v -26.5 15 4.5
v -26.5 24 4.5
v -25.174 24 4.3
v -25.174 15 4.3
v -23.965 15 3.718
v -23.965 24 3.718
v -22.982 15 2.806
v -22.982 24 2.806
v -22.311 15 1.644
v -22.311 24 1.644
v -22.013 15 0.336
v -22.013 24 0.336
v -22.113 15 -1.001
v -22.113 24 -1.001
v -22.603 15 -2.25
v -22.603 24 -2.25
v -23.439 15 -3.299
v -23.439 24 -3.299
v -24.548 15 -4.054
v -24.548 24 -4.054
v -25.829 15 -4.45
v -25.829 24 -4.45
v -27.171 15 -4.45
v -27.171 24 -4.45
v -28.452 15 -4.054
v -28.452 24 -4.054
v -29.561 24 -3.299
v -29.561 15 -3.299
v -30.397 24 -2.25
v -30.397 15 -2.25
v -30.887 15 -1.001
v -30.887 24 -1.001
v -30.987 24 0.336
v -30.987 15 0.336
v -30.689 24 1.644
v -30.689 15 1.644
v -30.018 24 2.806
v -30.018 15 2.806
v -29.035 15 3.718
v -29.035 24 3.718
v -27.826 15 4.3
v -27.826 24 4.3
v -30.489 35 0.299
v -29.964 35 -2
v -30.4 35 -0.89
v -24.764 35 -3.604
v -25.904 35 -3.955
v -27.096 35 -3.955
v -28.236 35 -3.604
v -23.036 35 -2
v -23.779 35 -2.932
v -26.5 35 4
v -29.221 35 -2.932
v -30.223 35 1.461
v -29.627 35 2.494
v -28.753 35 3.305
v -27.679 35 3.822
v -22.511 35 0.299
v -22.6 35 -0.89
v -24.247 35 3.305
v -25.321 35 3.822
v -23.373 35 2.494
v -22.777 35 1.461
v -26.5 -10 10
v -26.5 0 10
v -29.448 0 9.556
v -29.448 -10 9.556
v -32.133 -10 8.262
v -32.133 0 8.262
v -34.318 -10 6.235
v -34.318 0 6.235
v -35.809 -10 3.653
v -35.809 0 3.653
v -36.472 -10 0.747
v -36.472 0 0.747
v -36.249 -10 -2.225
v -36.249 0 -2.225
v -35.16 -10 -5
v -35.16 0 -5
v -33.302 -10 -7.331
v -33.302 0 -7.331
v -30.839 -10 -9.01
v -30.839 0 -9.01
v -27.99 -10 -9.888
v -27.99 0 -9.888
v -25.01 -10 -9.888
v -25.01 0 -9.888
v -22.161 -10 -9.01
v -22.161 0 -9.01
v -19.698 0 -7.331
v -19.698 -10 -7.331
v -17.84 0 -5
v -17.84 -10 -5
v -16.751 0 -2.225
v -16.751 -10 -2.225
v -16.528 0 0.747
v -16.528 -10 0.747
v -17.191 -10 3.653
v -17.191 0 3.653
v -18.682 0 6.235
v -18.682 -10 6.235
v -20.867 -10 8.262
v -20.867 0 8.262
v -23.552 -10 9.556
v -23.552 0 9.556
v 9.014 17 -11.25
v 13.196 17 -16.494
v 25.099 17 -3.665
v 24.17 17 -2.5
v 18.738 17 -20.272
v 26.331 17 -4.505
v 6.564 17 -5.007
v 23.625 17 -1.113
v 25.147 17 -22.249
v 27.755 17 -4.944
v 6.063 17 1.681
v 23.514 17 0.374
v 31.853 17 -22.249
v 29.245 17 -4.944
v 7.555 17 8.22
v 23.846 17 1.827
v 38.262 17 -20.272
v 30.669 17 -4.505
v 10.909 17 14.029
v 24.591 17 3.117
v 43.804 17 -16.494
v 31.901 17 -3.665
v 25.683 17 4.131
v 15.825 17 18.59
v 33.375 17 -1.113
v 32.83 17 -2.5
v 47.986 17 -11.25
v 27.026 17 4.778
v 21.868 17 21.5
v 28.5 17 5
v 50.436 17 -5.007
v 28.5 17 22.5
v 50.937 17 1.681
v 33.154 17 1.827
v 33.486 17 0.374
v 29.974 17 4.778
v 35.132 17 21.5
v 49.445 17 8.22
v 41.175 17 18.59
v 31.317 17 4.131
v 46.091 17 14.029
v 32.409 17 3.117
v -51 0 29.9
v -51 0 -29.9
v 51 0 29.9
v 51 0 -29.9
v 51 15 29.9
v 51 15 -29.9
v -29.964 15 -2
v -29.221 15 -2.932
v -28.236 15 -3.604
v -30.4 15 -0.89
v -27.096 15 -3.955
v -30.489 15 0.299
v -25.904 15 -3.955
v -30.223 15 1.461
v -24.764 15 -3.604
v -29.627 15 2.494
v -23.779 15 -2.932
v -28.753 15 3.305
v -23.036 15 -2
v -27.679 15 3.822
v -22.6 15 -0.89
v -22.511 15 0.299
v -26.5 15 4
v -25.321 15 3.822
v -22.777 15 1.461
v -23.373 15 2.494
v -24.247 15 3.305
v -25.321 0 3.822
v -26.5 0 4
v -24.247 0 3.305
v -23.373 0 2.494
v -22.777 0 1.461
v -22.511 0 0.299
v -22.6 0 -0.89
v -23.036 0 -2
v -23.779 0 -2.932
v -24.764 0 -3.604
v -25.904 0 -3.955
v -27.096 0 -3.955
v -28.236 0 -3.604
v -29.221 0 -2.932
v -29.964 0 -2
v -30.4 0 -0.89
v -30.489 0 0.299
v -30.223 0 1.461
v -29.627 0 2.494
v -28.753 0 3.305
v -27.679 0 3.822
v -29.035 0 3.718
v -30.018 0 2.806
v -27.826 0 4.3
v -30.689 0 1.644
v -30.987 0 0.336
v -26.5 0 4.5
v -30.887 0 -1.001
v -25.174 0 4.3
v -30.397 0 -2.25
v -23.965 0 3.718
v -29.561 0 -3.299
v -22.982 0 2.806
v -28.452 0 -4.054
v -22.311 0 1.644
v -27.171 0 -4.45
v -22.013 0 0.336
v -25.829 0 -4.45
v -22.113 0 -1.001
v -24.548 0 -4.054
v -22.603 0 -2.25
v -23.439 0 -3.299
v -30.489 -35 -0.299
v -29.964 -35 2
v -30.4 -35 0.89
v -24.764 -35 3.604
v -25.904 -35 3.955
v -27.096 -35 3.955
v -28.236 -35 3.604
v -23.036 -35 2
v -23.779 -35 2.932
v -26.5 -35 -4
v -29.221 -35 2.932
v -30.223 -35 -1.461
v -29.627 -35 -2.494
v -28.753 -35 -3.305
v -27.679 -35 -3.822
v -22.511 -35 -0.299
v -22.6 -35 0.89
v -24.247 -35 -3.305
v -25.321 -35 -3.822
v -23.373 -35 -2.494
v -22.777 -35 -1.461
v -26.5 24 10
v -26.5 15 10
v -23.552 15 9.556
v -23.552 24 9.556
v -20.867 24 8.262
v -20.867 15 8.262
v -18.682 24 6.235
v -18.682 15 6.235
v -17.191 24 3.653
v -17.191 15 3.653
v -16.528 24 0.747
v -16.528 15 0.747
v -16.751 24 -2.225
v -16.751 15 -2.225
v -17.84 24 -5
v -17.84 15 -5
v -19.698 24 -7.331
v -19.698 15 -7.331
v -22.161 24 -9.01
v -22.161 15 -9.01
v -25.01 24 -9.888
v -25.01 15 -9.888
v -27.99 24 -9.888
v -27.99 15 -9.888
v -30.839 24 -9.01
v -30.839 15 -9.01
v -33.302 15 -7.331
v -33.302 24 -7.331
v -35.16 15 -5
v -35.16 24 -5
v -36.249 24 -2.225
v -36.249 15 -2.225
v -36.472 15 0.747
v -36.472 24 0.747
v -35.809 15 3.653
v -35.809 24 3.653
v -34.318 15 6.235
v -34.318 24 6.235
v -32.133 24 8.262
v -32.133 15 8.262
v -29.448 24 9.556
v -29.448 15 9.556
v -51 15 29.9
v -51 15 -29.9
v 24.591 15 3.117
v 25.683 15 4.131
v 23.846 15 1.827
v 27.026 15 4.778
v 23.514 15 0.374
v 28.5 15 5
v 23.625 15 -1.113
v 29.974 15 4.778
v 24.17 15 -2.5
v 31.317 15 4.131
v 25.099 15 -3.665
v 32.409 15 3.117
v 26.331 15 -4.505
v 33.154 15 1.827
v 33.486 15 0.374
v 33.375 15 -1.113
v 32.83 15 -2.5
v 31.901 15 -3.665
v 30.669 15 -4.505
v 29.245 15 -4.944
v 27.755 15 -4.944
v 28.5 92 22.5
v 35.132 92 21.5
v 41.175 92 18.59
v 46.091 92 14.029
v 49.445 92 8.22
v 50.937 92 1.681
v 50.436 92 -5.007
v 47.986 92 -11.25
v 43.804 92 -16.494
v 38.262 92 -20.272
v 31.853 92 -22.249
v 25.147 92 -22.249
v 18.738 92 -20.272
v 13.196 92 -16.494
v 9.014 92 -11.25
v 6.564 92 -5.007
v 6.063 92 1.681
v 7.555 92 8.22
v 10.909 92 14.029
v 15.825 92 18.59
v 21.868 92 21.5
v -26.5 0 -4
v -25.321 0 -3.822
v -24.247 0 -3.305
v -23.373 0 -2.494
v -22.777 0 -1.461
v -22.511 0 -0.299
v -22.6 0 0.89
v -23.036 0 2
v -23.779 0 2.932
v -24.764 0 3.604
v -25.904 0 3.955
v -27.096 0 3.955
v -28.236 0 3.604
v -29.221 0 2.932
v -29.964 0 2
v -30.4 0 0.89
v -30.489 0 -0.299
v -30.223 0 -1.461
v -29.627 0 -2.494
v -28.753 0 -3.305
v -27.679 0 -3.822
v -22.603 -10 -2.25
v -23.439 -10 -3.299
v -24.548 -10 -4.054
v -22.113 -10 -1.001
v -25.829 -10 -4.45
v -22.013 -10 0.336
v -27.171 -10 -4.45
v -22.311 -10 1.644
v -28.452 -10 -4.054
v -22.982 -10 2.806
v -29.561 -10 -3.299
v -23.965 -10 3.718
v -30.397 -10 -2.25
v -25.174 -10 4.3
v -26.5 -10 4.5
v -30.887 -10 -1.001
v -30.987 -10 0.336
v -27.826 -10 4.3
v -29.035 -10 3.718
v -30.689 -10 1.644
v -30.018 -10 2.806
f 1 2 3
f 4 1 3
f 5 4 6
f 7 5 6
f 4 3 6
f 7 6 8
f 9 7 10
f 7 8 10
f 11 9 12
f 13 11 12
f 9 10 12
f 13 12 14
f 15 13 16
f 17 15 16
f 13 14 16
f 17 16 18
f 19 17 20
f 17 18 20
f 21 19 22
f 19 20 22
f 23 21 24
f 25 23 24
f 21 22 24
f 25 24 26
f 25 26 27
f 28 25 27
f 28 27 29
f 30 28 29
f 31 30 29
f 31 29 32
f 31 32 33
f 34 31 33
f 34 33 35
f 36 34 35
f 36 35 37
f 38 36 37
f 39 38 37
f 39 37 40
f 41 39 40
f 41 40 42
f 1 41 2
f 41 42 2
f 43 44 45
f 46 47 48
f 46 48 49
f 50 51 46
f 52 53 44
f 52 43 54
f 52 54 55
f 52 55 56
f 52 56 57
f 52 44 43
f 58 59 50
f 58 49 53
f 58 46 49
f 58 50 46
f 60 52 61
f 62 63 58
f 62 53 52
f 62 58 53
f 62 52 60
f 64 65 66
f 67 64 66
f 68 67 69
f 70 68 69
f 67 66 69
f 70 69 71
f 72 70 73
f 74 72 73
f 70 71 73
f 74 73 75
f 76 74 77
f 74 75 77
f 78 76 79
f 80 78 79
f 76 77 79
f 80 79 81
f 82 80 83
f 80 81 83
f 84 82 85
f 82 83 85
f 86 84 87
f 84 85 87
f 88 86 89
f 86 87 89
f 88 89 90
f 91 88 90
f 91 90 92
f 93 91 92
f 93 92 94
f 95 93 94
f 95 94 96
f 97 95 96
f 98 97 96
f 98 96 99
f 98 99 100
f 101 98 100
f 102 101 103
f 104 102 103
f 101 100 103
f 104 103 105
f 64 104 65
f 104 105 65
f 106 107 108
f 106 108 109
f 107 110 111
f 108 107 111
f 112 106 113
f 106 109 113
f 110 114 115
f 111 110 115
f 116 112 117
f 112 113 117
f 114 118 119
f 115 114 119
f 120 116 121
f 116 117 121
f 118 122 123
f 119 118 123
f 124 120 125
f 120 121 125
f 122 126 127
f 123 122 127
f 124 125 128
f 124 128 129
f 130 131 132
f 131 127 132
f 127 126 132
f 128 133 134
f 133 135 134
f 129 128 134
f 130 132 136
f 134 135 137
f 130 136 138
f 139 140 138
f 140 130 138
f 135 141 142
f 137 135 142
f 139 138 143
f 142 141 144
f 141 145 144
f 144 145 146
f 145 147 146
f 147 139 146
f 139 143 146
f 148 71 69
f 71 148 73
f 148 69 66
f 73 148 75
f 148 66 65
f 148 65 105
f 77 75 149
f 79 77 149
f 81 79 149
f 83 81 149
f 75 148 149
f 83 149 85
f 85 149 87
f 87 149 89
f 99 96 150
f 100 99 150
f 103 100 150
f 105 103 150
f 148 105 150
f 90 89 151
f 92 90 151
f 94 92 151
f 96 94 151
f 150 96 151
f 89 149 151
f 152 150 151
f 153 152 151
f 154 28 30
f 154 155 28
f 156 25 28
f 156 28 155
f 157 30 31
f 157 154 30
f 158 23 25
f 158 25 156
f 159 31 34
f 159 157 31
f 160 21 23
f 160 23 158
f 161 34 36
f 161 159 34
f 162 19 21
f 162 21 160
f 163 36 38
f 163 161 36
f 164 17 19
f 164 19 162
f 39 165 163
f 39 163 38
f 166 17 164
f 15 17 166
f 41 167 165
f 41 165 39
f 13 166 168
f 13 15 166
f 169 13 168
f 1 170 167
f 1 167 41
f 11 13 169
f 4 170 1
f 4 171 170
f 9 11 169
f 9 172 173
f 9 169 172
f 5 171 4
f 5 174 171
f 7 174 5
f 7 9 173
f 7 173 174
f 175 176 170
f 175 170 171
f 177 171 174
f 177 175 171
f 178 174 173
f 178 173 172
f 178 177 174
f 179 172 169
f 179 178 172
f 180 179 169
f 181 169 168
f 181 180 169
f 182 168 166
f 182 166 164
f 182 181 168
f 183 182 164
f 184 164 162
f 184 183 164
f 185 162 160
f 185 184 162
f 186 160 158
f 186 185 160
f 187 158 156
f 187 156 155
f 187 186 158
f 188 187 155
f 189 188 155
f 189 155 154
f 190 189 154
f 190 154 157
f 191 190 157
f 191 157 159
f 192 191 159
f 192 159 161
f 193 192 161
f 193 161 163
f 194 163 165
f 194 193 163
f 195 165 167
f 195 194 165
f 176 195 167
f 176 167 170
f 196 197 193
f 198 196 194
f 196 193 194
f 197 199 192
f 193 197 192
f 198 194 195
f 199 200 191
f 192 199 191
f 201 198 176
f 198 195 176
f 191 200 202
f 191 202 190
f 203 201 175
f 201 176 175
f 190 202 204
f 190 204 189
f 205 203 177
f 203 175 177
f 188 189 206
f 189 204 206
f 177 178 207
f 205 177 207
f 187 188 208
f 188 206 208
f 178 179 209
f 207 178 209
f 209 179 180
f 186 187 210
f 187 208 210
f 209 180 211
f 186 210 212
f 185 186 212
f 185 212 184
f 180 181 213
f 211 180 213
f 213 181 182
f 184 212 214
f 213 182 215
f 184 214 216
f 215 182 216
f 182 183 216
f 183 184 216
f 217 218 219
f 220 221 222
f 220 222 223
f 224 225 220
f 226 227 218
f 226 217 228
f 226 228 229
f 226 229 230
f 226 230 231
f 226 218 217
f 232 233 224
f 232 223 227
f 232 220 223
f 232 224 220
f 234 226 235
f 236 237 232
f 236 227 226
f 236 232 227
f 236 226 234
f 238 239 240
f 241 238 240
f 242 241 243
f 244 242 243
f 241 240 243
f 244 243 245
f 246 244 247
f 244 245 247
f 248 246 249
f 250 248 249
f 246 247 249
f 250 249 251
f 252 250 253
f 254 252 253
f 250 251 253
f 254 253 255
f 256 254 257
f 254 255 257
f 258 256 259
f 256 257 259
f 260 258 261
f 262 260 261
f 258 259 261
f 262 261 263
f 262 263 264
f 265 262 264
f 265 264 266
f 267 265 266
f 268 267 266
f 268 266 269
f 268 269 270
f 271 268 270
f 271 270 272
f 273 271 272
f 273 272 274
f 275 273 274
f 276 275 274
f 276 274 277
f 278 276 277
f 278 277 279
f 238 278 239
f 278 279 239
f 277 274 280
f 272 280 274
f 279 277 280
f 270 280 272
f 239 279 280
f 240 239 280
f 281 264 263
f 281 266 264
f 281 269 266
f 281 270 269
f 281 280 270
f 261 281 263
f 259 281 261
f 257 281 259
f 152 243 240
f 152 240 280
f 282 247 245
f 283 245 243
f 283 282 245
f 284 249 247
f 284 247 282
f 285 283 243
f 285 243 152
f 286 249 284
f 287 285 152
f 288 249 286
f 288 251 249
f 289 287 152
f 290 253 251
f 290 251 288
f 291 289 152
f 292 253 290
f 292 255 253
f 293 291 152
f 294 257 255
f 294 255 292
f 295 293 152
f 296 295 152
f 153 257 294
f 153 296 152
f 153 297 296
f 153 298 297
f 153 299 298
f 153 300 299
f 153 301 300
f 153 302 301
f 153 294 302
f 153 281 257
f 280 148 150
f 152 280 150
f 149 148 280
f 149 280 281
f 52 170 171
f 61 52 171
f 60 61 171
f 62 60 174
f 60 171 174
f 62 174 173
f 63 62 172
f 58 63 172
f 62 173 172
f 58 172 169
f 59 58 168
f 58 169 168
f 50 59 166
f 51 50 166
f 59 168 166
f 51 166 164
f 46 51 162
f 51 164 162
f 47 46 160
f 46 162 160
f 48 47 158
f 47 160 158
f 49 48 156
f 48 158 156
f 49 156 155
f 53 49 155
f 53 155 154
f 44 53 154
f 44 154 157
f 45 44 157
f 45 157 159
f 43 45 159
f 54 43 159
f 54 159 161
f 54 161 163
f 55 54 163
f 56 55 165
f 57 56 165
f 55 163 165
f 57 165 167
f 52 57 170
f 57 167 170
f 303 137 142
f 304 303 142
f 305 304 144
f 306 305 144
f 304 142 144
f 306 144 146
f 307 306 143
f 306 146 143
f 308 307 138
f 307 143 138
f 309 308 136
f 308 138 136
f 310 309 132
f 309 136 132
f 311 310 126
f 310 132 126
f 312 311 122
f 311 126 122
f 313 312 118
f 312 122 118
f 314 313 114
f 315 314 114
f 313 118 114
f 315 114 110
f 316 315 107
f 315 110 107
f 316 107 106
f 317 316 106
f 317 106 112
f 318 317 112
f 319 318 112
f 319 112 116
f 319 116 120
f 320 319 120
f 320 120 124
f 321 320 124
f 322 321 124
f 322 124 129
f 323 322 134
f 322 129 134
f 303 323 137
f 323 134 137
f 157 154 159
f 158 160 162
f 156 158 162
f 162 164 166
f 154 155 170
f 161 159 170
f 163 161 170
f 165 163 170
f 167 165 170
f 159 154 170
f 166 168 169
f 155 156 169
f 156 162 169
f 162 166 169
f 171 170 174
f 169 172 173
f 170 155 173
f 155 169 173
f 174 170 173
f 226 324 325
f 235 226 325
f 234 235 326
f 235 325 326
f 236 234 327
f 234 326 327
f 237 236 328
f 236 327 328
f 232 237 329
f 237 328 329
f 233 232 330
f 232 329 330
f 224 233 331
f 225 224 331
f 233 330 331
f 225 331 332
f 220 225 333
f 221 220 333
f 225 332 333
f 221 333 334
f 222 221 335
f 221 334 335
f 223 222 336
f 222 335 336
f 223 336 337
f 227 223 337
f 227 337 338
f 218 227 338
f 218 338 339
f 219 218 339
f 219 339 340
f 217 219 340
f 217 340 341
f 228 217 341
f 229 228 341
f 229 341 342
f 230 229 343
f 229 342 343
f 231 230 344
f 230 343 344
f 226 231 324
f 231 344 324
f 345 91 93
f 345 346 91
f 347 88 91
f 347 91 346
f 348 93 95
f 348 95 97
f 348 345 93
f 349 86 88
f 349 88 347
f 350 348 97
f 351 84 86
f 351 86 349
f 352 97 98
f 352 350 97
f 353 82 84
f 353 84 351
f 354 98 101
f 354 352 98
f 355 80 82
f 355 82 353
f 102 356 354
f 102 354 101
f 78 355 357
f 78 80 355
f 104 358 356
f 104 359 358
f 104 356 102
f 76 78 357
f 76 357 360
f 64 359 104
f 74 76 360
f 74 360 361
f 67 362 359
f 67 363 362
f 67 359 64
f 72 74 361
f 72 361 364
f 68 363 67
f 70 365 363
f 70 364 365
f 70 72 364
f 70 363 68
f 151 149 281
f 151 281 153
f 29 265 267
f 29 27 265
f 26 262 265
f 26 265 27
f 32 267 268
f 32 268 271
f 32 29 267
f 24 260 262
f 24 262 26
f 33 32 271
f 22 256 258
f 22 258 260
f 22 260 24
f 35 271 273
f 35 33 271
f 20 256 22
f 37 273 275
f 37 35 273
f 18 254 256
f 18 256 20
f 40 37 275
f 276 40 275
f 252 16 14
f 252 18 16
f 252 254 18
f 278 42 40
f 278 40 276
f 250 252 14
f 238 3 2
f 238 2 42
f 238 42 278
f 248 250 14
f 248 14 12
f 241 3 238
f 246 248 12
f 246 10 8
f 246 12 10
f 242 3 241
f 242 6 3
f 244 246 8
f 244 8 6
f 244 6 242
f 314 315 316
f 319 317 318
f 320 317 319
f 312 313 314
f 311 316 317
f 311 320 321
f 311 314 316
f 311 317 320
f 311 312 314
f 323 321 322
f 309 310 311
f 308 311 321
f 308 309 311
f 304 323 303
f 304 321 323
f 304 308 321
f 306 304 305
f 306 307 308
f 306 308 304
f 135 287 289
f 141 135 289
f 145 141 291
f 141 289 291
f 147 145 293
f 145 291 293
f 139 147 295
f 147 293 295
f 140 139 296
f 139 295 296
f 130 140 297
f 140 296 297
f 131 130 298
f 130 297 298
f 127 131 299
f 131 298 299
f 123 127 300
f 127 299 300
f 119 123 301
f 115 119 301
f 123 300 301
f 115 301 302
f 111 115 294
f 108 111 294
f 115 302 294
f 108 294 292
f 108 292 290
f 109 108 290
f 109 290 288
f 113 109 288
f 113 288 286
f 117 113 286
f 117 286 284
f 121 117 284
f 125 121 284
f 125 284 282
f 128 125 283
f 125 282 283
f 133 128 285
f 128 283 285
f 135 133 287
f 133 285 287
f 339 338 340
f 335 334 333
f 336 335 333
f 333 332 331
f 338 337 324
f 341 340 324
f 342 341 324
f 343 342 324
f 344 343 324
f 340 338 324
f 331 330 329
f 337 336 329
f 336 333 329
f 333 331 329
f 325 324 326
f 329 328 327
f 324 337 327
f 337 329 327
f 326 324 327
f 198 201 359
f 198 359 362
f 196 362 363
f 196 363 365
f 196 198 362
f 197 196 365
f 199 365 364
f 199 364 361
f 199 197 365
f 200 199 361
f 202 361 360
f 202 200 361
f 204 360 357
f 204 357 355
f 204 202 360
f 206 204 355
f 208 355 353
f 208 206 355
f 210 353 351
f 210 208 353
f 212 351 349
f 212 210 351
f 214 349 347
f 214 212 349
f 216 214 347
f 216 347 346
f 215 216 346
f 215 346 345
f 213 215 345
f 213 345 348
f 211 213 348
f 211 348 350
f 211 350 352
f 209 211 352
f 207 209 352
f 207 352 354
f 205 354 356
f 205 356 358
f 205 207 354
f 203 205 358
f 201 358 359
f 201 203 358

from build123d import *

# Parameters (mm, degrees)
SKETCH1_W           = 102
SKETCH1_H           = 59.8
SKETCH1_R           = 4
BOSS_EXTRUDE1_DEPTH = 15
SKETCH3_R           = 5
BOSS_EXTRUDE3_DEPTH = 2
SKETCH4_R           = 22.5
BOSS_EXTRUDE4_DEPTH = 75
SKETCH5_R           = 10
BOSS_EXTRUDE5_DEPTH = 9
SKETCH6_R           = 4.5
CUT_EXTRUDE1_DEPTH  = 9
SKETCH7_R           = 4
BOSS_EXTRUDE6_DEPTH = 20
SKETCH8_R           = 10
SKETCH8_R_2         = 4.5
BOSS_EXTRUDE7_DEPTH = 10
SKETCH9_R           = 4
BOSS_EXTRUDE8_DEPTH = 35


with BuildPart() as part:
    # Sketch1 → Boss-Extrude1 (new body)
    with BuildSketch(Plane(origin=(0, 0, 0), x_dir=(1, 0, 0), z_dir=(0, 1, 0))):
        Rectangle(SKETCH1_W, SKETCH1_H)
        with Locations(Location((-26.5, 0, 0), (0, 0, 270))):
            Circle(SKETCH1_R, mode=Mode.SUBTRACT)
    extrude(amount=BOSS_EXTRUDE1_DEPTH)

    # Sketch3 → Boss-Extrude3 (add)
    with BuildSketch(Plane(origin=(0, 15, 0), x_dir=(1, 0, 0), z_dir=(0, 1, 0))):
        with Locations(Location((28.5, 0, 0), (0, 0, 270))):
            Circle(SKETCH3_R)
    extrude(amount=BOSS_EXTRUDE3_DEPTH)

    # Sketch4 → Boss-Extrude4 (add)
    with BuildSketch(Plane(origin=(0, 17, 0), x_dir=(1, 0, 0), z_dir=(0, 1, 0))):
        with Locations(Location((28.5, 0, 0), (0, 0, 270))):
            Circle(SKETCH4_R)
    extrude(amount=BOSS_EXTRUDE4_DEPTH)

    # Sketch5 → Boss-Extrude5 (add)
    with BuildSketch(Plane(origin=(0, 15, 0), x_dir=(1, 0, 0), z_dir=(0, 1, 0))):
        with Locations(Location((-26.5, 0, 0), (0, 0, 270))):
            Circle(SKETCH5_R)
    extrude(amount=BOSS_EXTRUDE5_DEPTH)

    # Sketch6 → Cut-Extrude1 (cut)
    with BuildSketch(Plane(origin=(0, 24, 0), x_dir=(1, 0, 0), z_dir=(0, 1, 0))):
        with Locations(Location((-26.5, 0, 0), (0, 0, 270))):
            Circle(SKETCH6_R)
    extrude(amount=-CUT_EXTRUDE1_DEPTH, mode=Mode.SUBTRACT)

    # Sketch8 → Boss-Extrude7 (add)
    with BuildSketch(Plane.XZ):
        with Locations(Location((-26.5, 0, 0), (0, 0, 90))):
            Circle(SKETCH8_R)
        with Locations(Location((-26.5, 0, 0), (0, 0, 90))):
            Circle(SKETCH8_R_2, mode=Mode.SUBTRACT)
    extrude(amount=BOSS_EXTRUDE7_DEPTH)


with BuildPart() as body_2:
    # Sketch7 → Boss-Extrude6 (new body)
    with BuildSketch(Plane(origin=(0, 15, 0), x_dir=(1, 0, 0), z_dir=(0, 1, 0))):
        with Locations(Location((-26.5, 0, 0), (0, 0, 270))):
            Circle(SKETCH7_R)
    extrude(amount=BOSS_EXTRUDE6_DEPTH)


with BuildPart() as body_3:
    # Sketch9 → Boss-Extrude8 (new body)
    with BuildSketch(Plane.XZ):
        with Locations(Location((-26.5, 0, 0), (0, 0, 270))):
            Circle(SKETCH9_R)
    extrude(amount=BOSS_EXTRUDE8_DEPTH)


solid = Compound([part.part, body_2.part, body_3.part])
